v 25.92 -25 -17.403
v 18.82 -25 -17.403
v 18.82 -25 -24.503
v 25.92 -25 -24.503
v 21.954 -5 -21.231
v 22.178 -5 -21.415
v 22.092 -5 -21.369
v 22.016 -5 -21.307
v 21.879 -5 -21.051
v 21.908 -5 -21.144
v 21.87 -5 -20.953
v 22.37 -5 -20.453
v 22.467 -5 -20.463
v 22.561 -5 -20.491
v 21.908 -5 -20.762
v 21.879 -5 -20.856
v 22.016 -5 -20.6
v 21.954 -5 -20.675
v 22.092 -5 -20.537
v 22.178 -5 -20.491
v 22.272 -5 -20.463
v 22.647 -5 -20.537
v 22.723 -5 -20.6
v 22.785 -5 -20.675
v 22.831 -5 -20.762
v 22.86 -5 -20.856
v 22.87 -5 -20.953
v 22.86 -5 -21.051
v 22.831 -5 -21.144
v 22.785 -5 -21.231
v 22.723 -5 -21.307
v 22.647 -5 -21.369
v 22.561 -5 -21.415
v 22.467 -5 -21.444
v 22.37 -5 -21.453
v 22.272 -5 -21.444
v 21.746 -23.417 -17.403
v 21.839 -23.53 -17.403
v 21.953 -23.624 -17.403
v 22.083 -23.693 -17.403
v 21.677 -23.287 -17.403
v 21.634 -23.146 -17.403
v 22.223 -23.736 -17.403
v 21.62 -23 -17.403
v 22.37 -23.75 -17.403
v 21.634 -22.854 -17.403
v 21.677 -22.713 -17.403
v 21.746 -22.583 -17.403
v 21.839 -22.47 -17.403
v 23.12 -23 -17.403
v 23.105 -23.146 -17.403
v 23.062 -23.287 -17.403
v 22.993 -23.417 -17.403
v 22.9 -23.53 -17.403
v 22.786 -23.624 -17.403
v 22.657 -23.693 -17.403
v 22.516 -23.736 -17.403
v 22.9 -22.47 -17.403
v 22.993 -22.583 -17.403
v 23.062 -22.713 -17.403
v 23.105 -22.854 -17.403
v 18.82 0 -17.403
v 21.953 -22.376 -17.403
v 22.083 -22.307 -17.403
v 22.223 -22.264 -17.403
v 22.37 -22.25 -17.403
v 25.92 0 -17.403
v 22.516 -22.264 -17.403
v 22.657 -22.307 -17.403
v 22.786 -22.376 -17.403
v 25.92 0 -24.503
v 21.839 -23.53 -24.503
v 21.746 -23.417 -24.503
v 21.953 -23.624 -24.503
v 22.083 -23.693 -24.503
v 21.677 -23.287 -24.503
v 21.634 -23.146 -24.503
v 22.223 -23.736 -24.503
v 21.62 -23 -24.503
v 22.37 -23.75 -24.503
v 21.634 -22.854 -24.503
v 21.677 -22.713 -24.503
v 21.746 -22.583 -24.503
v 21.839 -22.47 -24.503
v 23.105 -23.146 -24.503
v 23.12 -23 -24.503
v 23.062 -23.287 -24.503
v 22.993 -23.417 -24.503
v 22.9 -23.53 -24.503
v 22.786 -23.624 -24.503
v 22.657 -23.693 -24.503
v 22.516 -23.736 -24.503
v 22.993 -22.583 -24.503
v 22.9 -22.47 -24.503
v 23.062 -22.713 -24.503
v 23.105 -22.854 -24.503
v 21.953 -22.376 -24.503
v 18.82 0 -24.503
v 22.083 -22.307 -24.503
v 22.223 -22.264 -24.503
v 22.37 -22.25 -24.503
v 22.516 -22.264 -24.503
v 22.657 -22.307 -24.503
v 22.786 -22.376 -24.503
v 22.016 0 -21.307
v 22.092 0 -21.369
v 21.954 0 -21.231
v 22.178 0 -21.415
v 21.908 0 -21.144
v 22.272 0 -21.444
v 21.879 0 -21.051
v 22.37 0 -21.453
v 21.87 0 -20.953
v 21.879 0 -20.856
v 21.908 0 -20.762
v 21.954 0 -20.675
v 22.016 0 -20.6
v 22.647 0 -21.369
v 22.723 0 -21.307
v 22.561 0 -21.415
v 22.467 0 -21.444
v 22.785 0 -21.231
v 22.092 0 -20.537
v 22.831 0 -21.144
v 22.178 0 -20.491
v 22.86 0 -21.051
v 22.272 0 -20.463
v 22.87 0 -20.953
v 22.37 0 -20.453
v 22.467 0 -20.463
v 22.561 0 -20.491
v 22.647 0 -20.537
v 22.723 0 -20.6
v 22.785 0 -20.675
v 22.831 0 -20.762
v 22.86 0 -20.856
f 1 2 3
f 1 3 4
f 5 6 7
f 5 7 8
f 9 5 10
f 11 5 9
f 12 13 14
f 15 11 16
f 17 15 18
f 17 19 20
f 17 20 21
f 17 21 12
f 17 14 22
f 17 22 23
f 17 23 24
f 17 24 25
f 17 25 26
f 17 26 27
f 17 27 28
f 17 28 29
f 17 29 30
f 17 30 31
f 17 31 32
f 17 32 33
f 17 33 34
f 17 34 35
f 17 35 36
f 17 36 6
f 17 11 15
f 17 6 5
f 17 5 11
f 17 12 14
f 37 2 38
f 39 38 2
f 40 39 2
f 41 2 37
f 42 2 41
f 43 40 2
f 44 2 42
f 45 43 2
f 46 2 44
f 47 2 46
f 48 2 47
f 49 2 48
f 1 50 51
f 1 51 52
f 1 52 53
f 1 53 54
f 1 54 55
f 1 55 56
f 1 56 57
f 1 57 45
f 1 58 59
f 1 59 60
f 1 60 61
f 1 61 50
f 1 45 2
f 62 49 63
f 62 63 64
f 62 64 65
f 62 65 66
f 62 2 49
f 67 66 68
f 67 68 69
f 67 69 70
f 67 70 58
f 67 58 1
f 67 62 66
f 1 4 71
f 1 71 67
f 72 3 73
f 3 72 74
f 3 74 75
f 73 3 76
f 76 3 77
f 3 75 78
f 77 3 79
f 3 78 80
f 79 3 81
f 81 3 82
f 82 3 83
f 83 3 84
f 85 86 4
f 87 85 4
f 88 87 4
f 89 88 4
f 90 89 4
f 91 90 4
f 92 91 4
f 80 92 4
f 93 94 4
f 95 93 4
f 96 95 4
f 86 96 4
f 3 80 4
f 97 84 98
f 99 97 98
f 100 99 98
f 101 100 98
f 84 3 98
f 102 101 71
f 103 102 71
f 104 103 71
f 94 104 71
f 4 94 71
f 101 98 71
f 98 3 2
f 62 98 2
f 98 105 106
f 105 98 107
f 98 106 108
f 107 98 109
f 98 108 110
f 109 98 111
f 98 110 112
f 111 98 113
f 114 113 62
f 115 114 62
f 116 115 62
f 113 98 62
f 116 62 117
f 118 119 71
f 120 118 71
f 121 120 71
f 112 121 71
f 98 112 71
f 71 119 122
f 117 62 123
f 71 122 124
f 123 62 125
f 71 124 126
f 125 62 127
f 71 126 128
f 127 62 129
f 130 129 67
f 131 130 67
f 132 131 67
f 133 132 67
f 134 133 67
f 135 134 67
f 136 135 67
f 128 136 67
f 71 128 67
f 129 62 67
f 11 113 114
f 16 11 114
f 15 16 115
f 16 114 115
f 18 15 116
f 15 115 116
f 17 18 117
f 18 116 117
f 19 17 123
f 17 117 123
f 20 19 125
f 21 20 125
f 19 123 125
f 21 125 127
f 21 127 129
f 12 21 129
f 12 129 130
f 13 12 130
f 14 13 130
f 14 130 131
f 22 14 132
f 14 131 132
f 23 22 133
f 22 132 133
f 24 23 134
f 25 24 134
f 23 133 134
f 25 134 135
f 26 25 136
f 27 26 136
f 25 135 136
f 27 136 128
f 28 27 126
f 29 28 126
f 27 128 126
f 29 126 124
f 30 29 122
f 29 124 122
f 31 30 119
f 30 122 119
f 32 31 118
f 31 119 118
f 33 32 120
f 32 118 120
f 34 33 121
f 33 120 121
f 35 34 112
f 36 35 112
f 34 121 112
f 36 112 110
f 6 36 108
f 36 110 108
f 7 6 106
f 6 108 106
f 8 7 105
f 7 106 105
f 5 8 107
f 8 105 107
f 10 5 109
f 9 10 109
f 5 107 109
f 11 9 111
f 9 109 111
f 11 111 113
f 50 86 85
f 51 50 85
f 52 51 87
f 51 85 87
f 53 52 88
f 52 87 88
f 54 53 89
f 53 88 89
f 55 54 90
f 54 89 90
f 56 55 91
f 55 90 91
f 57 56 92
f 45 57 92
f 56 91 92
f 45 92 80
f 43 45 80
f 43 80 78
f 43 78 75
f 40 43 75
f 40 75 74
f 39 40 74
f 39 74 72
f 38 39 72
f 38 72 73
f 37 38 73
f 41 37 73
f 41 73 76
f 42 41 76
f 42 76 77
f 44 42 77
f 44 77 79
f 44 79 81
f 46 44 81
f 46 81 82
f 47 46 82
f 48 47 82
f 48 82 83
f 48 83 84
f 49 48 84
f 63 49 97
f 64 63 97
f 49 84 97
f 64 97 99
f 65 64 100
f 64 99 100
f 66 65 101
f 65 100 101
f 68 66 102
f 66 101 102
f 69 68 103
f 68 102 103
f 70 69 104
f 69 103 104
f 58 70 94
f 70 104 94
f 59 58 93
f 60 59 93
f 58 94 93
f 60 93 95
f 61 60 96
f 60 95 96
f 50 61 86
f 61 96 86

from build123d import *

# Parameters (mm, degrees)
F0_W     = 7.1
F0_H     = 7.1
F1_DEPTH = 25
F2_R     = 0.75
F3_DEPTH = 25
F4_R     = 0.5
F5_DEPTH = 5


with BuildPart() as f1:
    # F0 (on Front) → F1 (new body)
    with BuildSketch(Plane.XZ):
        with Locations((22.369518, -20.953149)):
            Rectangle(F0_W, F0_H)
    extrude(amount=F1_DEPTH)

    # F2 (on face) → F3 (cut)
    with BuildSketch(Plane(origin=(0, 0, -24.503149), x_dir=(1, 0, 0), z_dir=(0, 0, -1))):
        with Locations((22.369518, 23)):
            Circle(F2_R)
    extrude(amount=-F3_DEPTH, mode=Mode.SUBTRACT)

    # F4 (on face) → F5 (cut)
    with BuildSketch(Plane(origin=(0, 0, 0), x_dir=(-1, 0, 0), z_dir=(0, 1, 0))):
        with Locations((-22.369518, -20.953149)):
            Circle(F4_R)
    extrude(amount=-F5_DEPTH, mode=Mode.SUBTRACT)


solid = f1.part
